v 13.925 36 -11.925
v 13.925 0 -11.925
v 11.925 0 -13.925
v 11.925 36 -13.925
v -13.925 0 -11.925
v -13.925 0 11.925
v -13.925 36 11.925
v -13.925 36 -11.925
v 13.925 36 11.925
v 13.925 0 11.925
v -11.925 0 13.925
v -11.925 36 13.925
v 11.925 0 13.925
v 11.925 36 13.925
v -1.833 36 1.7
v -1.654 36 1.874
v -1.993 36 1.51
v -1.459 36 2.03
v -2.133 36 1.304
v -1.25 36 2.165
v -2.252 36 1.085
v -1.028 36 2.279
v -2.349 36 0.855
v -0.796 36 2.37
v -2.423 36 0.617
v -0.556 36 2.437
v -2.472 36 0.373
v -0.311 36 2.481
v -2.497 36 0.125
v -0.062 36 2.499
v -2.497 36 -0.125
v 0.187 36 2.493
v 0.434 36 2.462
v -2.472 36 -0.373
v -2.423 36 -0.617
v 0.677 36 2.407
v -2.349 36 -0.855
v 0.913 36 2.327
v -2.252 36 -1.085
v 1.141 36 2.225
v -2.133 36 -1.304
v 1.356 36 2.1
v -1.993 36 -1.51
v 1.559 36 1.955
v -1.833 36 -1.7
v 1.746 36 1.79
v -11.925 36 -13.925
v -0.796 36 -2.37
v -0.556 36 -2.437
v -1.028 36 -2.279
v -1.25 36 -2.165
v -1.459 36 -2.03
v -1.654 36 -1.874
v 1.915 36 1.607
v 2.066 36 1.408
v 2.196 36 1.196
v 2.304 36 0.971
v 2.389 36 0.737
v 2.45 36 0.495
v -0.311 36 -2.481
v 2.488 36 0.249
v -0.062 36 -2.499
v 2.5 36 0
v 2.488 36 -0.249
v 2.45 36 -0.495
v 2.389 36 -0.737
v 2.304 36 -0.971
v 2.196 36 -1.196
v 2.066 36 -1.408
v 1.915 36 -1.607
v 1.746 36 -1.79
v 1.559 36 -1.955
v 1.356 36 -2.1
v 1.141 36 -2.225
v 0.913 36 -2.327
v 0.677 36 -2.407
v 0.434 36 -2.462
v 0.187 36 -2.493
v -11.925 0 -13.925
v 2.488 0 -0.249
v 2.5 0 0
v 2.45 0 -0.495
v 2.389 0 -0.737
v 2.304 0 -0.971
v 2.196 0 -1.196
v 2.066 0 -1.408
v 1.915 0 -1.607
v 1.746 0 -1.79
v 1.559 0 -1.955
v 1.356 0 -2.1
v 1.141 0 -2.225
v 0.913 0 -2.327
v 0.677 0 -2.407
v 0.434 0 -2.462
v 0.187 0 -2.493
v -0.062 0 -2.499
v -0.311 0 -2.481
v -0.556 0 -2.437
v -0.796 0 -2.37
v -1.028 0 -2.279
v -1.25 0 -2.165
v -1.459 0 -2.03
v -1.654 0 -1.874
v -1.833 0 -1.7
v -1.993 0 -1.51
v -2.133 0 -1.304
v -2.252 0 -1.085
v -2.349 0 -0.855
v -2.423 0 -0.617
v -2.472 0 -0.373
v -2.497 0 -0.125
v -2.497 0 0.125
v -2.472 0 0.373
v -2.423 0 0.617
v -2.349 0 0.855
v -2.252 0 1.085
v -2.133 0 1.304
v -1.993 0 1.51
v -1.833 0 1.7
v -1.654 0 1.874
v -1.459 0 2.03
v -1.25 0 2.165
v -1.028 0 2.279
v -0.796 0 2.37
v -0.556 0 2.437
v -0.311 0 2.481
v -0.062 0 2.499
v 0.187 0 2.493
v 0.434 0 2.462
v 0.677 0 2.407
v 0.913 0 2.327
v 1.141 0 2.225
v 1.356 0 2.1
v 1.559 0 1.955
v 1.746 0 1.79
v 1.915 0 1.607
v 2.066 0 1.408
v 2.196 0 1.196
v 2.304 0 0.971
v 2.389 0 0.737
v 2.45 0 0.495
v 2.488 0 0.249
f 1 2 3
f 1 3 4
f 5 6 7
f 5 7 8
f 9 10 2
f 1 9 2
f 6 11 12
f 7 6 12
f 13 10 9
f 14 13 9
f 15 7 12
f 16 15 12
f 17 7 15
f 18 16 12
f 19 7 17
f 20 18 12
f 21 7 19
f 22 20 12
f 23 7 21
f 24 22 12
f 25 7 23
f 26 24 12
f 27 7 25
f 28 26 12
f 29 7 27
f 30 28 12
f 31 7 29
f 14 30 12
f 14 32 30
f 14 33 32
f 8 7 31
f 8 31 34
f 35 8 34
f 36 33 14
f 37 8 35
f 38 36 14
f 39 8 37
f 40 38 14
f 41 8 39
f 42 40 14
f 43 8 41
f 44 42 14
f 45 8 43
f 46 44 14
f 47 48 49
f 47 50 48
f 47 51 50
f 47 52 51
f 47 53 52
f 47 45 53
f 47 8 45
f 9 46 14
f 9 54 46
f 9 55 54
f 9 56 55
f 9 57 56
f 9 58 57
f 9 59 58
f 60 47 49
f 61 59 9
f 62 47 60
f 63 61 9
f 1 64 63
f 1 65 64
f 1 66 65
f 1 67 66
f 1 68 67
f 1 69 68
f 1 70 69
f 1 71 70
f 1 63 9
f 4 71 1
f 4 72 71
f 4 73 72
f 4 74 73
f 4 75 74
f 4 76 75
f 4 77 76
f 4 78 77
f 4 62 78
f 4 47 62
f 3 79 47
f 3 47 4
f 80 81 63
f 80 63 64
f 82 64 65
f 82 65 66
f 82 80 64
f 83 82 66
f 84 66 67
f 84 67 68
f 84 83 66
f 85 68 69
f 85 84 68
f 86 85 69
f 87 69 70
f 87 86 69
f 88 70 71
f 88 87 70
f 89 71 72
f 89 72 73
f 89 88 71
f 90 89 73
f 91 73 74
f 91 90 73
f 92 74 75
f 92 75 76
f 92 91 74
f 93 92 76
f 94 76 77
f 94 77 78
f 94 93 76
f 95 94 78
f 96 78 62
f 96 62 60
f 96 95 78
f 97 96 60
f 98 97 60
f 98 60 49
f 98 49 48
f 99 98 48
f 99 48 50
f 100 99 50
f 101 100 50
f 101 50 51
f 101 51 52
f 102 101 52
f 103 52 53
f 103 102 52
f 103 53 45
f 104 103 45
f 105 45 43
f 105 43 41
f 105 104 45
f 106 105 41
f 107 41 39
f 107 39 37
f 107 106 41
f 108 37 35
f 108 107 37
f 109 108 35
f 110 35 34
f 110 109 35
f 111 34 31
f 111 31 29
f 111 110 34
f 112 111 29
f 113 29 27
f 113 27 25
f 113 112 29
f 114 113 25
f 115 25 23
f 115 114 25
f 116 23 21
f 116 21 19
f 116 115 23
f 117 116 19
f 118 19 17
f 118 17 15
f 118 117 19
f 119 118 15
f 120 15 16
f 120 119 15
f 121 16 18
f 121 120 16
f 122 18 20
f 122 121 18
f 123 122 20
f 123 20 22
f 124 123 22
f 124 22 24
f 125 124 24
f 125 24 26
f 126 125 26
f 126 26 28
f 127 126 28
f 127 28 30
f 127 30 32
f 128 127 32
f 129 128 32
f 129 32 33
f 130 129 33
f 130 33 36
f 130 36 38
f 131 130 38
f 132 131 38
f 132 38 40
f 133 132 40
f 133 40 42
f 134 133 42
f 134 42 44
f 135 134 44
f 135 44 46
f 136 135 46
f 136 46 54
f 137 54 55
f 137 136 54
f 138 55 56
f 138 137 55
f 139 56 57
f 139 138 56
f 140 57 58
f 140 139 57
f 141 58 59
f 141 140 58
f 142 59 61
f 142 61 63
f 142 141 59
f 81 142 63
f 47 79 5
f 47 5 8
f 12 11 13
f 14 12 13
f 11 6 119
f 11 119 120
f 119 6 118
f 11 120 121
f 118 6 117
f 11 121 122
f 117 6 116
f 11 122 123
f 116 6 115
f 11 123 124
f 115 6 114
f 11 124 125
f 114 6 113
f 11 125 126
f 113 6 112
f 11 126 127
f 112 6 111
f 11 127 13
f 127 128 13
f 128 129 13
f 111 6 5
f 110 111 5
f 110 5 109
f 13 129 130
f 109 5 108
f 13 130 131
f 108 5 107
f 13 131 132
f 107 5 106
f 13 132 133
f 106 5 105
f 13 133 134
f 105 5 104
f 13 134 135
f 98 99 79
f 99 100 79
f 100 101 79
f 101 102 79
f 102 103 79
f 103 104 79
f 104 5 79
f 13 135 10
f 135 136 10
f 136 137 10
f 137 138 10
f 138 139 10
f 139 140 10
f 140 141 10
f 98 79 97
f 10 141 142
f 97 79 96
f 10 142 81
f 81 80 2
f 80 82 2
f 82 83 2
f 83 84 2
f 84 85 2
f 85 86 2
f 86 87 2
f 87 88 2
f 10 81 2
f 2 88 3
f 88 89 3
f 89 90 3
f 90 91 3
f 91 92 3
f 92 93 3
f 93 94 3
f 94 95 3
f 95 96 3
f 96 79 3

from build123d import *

# Parameters (mm, degrees)
SKETCH_2_W      = 27.85
SKETCH_2_H      = 27.85
SKETCH_2_R      = 2.5
EXTRUDE_1_DEPTH = 36
CHAMFER_1_SIZE  = 2


with BuildPart() as part:
    # Эскиз2 → Бобышка-Вытянуть1 (new body)
    with BuildSketch(Plane(origin=(0, 0, 0), x_dir=(1, 0, 0), z_dir=(0, 1, 0))):
        Rectangle(SKETCH_2_W, SKETCH_2_H)
        Circle(SKETCH_2_R, mode=Mode.SUBTRACT)
    extrude(amount=EXTRUDE_1_DEPTH)

    # Фаска1
    chamfer_1_edges = [part.edges().sort_by_distance(p)[0] for p in [
        (13.925, 18, -13.925),
        (13.925, 18, 13.925),
        (-13.925, 18, 13.925),
        (-13.925, 18, -13.925),
    ]]
    chamfer(chamfer_1_edges, length=CHAMFER_1_SIZE)


solid = part.part
